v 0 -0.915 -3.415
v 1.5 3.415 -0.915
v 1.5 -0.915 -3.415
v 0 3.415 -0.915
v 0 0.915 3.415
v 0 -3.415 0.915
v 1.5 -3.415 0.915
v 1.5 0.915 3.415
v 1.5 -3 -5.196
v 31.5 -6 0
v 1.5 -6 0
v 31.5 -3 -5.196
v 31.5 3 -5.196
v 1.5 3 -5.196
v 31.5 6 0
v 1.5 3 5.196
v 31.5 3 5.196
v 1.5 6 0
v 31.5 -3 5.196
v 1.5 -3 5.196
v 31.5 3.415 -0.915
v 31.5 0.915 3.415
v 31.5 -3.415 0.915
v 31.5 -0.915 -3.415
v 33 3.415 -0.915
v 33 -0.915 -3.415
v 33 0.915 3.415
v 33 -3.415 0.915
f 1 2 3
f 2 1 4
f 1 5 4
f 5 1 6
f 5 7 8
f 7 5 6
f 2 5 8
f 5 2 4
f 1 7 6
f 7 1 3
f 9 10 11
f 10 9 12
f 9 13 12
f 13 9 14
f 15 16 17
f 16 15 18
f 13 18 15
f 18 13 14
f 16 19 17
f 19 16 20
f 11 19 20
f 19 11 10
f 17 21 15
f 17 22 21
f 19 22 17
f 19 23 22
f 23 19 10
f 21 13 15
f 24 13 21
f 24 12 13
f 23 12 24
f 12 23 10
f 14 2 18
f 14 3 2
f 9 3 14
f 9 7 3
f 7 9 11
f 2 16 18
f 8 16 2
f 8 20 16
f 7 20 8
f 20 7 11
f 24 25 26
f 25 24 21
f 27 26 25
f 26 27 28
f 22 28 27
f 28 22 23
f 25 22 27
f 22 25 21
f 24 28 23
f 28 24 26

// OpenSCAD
// file: ModuleKatzenklappe.scad
// //////////////////////////////////
// Module für Katzenklappenverschluss
// //////////////////////////////////

module armHorn (laenge, breite, dicke) {
    difference() {
    union() {
    translate ([0,-breite/2,0])
    cube([laenge,breite,dicke], false);
    translate ([laenge,0,0])
    cylinder(dicke,r=breite/2, false); 
    }
    translate ([laenge*0.8,0,0])
    loch(radius=2,tiefe= dicke + 1);
    translate ([laenge*0.6,0,dicke-1])
    letter("Achim");
    translate ([laenge*0.6,0,1])
    rotate([0,180,0])
    letter("Tim");
    translate ([laenge*0.4,0,0])
    loch(radius=2,tiefe= dicke + 1);
    }
};

module mittelRad (breite) {
    difference() {
        //cylinder(breite,r=40, false);
        translate([0,0,breite])
        gear (
            toothNo = 25, 
            toothWidth = 5, 
            toothHeight  = 10, 
            thickness = breite,
            holeRadius = 5,
            holeSides = 6
        );
        translate ([-25,0,0])
        loch(radius=5,tiefe=breite + 1);
        translate ([25,0,0])
        loch(radius=5,tiefe=breite + 1);
        translate ([0,-25,0])
        loch(radius=5,tiefe=breite + 1);
        translate ([0,25,0])
        loch(radius=5,tiefe=breite + 1);
        } 
};

module loch (radius, tiefe) {
        cylinder(tiefe,r=radius, false);   
};

module zapfen (breite,tiefe) {
        cube([breite,breite,tiefe], true);   
};

module lArm(laenge, breite, dicke) {
    difference() {
        union() {
            armHorn(laenge=laenge, breite=breite, dicke=dicke);
            rotate(90) armHorn(laenge=laenge, breite=breite, dicke=dicke);
            cylinder(dicke,r=breite/2, false); 
           }
            translate ([0,0,0])
            zapfen(breite= 3, tiefe = dicke * 2);
        }
};

module mittelAchse(laenge, radius_achse, zapfen_breite, zapfen_laenge, breite) {
    translate ([0,0,zapfen_laenge /2])
    zapfen(breite= zapfen_breite, tiefe=zapfen_laenge);   
    translate ([0,0,zapfen_laenge/2])
    cylinder(laenge,r = radius_achse, false, $fn=6);
    translate ([0,0,laenge+zapfen_laenge / 2])
    zapfen(breite= zapfen_breite, tiefe=zapfen_laenge);   
};


module tooth(width, thickness, height){
  scale([width/5,thickness/5,height/10]){
    difference(){
      translate([-2.5,0,0])
      cube([5,5,10]);
      translate([5+1.25-2.5,0-1,0])
      rotate([0,-14.0362434,0])
        cube([5,5+2,12]);
      translate([0-1.25-2.5,0+5+1,0])
      rotate([0,-14.0362434,180])
        cube([5,5+2,12]);
    }
  }
}
module gear(toothNo, toothWidth, toothHeight, thickness,holeRadius,holeSides){
  radius = (toothWidth*1.7*toothNo)/3.141592653589793238/2;
  rotate([-90,0,0])
  difference(){
    union(){
      for(i=[0:toothNo]){
        rotate([0,(360/toothNo)*i,0])
        translate([0,0,radius-0.5])
          tooth(toothWidth,thickness,toothHeight);
      }
      translate([0,thickness,0])
      rotate([90,0,0])
        cylinder(r=radius, h=thickness);
    }
  translate([0,thickness+1,0])
  rotate([90,0,0])
    cylinder(r=holeRadius,h=thickness+2,$fn=holeSides);
  }
}

font = "Liberation Sans";


letter_size = 5;
letter_height = 3;


module letter(l) {
  // Use linear_extrude() to make the letters 3D objects as they
  // are only 2D shapes when only using text()
  linear_extrude(height = letter_height) {
    text(l, size = letter_size, font = font, halign = "center", valign = "center", $fn = 16);
  }
}
// main file
include <ModuleKatzenklappe.scad>;
$fn = 40;

// Maße der Mittelachse
mittelAchseLaenge       = 30;
mittelAchseRadius       = 6;
mittelAchseZapfenBreite = 5;
mittelAchseZapfenLaenge = 3;
mittelAchseRadBreite    = 5;


rotate([0,90,0])
rotate([0,0,30])
mittelAchse(laenge = mittelAchseLaenge, radius_achse = mittelAchseRadius, zapfen_breite = mittelAchseZapfenBreite, zapfen_laenge = mittelAchseZapfenLaenge, breite = mittelAchseRadBreite);
